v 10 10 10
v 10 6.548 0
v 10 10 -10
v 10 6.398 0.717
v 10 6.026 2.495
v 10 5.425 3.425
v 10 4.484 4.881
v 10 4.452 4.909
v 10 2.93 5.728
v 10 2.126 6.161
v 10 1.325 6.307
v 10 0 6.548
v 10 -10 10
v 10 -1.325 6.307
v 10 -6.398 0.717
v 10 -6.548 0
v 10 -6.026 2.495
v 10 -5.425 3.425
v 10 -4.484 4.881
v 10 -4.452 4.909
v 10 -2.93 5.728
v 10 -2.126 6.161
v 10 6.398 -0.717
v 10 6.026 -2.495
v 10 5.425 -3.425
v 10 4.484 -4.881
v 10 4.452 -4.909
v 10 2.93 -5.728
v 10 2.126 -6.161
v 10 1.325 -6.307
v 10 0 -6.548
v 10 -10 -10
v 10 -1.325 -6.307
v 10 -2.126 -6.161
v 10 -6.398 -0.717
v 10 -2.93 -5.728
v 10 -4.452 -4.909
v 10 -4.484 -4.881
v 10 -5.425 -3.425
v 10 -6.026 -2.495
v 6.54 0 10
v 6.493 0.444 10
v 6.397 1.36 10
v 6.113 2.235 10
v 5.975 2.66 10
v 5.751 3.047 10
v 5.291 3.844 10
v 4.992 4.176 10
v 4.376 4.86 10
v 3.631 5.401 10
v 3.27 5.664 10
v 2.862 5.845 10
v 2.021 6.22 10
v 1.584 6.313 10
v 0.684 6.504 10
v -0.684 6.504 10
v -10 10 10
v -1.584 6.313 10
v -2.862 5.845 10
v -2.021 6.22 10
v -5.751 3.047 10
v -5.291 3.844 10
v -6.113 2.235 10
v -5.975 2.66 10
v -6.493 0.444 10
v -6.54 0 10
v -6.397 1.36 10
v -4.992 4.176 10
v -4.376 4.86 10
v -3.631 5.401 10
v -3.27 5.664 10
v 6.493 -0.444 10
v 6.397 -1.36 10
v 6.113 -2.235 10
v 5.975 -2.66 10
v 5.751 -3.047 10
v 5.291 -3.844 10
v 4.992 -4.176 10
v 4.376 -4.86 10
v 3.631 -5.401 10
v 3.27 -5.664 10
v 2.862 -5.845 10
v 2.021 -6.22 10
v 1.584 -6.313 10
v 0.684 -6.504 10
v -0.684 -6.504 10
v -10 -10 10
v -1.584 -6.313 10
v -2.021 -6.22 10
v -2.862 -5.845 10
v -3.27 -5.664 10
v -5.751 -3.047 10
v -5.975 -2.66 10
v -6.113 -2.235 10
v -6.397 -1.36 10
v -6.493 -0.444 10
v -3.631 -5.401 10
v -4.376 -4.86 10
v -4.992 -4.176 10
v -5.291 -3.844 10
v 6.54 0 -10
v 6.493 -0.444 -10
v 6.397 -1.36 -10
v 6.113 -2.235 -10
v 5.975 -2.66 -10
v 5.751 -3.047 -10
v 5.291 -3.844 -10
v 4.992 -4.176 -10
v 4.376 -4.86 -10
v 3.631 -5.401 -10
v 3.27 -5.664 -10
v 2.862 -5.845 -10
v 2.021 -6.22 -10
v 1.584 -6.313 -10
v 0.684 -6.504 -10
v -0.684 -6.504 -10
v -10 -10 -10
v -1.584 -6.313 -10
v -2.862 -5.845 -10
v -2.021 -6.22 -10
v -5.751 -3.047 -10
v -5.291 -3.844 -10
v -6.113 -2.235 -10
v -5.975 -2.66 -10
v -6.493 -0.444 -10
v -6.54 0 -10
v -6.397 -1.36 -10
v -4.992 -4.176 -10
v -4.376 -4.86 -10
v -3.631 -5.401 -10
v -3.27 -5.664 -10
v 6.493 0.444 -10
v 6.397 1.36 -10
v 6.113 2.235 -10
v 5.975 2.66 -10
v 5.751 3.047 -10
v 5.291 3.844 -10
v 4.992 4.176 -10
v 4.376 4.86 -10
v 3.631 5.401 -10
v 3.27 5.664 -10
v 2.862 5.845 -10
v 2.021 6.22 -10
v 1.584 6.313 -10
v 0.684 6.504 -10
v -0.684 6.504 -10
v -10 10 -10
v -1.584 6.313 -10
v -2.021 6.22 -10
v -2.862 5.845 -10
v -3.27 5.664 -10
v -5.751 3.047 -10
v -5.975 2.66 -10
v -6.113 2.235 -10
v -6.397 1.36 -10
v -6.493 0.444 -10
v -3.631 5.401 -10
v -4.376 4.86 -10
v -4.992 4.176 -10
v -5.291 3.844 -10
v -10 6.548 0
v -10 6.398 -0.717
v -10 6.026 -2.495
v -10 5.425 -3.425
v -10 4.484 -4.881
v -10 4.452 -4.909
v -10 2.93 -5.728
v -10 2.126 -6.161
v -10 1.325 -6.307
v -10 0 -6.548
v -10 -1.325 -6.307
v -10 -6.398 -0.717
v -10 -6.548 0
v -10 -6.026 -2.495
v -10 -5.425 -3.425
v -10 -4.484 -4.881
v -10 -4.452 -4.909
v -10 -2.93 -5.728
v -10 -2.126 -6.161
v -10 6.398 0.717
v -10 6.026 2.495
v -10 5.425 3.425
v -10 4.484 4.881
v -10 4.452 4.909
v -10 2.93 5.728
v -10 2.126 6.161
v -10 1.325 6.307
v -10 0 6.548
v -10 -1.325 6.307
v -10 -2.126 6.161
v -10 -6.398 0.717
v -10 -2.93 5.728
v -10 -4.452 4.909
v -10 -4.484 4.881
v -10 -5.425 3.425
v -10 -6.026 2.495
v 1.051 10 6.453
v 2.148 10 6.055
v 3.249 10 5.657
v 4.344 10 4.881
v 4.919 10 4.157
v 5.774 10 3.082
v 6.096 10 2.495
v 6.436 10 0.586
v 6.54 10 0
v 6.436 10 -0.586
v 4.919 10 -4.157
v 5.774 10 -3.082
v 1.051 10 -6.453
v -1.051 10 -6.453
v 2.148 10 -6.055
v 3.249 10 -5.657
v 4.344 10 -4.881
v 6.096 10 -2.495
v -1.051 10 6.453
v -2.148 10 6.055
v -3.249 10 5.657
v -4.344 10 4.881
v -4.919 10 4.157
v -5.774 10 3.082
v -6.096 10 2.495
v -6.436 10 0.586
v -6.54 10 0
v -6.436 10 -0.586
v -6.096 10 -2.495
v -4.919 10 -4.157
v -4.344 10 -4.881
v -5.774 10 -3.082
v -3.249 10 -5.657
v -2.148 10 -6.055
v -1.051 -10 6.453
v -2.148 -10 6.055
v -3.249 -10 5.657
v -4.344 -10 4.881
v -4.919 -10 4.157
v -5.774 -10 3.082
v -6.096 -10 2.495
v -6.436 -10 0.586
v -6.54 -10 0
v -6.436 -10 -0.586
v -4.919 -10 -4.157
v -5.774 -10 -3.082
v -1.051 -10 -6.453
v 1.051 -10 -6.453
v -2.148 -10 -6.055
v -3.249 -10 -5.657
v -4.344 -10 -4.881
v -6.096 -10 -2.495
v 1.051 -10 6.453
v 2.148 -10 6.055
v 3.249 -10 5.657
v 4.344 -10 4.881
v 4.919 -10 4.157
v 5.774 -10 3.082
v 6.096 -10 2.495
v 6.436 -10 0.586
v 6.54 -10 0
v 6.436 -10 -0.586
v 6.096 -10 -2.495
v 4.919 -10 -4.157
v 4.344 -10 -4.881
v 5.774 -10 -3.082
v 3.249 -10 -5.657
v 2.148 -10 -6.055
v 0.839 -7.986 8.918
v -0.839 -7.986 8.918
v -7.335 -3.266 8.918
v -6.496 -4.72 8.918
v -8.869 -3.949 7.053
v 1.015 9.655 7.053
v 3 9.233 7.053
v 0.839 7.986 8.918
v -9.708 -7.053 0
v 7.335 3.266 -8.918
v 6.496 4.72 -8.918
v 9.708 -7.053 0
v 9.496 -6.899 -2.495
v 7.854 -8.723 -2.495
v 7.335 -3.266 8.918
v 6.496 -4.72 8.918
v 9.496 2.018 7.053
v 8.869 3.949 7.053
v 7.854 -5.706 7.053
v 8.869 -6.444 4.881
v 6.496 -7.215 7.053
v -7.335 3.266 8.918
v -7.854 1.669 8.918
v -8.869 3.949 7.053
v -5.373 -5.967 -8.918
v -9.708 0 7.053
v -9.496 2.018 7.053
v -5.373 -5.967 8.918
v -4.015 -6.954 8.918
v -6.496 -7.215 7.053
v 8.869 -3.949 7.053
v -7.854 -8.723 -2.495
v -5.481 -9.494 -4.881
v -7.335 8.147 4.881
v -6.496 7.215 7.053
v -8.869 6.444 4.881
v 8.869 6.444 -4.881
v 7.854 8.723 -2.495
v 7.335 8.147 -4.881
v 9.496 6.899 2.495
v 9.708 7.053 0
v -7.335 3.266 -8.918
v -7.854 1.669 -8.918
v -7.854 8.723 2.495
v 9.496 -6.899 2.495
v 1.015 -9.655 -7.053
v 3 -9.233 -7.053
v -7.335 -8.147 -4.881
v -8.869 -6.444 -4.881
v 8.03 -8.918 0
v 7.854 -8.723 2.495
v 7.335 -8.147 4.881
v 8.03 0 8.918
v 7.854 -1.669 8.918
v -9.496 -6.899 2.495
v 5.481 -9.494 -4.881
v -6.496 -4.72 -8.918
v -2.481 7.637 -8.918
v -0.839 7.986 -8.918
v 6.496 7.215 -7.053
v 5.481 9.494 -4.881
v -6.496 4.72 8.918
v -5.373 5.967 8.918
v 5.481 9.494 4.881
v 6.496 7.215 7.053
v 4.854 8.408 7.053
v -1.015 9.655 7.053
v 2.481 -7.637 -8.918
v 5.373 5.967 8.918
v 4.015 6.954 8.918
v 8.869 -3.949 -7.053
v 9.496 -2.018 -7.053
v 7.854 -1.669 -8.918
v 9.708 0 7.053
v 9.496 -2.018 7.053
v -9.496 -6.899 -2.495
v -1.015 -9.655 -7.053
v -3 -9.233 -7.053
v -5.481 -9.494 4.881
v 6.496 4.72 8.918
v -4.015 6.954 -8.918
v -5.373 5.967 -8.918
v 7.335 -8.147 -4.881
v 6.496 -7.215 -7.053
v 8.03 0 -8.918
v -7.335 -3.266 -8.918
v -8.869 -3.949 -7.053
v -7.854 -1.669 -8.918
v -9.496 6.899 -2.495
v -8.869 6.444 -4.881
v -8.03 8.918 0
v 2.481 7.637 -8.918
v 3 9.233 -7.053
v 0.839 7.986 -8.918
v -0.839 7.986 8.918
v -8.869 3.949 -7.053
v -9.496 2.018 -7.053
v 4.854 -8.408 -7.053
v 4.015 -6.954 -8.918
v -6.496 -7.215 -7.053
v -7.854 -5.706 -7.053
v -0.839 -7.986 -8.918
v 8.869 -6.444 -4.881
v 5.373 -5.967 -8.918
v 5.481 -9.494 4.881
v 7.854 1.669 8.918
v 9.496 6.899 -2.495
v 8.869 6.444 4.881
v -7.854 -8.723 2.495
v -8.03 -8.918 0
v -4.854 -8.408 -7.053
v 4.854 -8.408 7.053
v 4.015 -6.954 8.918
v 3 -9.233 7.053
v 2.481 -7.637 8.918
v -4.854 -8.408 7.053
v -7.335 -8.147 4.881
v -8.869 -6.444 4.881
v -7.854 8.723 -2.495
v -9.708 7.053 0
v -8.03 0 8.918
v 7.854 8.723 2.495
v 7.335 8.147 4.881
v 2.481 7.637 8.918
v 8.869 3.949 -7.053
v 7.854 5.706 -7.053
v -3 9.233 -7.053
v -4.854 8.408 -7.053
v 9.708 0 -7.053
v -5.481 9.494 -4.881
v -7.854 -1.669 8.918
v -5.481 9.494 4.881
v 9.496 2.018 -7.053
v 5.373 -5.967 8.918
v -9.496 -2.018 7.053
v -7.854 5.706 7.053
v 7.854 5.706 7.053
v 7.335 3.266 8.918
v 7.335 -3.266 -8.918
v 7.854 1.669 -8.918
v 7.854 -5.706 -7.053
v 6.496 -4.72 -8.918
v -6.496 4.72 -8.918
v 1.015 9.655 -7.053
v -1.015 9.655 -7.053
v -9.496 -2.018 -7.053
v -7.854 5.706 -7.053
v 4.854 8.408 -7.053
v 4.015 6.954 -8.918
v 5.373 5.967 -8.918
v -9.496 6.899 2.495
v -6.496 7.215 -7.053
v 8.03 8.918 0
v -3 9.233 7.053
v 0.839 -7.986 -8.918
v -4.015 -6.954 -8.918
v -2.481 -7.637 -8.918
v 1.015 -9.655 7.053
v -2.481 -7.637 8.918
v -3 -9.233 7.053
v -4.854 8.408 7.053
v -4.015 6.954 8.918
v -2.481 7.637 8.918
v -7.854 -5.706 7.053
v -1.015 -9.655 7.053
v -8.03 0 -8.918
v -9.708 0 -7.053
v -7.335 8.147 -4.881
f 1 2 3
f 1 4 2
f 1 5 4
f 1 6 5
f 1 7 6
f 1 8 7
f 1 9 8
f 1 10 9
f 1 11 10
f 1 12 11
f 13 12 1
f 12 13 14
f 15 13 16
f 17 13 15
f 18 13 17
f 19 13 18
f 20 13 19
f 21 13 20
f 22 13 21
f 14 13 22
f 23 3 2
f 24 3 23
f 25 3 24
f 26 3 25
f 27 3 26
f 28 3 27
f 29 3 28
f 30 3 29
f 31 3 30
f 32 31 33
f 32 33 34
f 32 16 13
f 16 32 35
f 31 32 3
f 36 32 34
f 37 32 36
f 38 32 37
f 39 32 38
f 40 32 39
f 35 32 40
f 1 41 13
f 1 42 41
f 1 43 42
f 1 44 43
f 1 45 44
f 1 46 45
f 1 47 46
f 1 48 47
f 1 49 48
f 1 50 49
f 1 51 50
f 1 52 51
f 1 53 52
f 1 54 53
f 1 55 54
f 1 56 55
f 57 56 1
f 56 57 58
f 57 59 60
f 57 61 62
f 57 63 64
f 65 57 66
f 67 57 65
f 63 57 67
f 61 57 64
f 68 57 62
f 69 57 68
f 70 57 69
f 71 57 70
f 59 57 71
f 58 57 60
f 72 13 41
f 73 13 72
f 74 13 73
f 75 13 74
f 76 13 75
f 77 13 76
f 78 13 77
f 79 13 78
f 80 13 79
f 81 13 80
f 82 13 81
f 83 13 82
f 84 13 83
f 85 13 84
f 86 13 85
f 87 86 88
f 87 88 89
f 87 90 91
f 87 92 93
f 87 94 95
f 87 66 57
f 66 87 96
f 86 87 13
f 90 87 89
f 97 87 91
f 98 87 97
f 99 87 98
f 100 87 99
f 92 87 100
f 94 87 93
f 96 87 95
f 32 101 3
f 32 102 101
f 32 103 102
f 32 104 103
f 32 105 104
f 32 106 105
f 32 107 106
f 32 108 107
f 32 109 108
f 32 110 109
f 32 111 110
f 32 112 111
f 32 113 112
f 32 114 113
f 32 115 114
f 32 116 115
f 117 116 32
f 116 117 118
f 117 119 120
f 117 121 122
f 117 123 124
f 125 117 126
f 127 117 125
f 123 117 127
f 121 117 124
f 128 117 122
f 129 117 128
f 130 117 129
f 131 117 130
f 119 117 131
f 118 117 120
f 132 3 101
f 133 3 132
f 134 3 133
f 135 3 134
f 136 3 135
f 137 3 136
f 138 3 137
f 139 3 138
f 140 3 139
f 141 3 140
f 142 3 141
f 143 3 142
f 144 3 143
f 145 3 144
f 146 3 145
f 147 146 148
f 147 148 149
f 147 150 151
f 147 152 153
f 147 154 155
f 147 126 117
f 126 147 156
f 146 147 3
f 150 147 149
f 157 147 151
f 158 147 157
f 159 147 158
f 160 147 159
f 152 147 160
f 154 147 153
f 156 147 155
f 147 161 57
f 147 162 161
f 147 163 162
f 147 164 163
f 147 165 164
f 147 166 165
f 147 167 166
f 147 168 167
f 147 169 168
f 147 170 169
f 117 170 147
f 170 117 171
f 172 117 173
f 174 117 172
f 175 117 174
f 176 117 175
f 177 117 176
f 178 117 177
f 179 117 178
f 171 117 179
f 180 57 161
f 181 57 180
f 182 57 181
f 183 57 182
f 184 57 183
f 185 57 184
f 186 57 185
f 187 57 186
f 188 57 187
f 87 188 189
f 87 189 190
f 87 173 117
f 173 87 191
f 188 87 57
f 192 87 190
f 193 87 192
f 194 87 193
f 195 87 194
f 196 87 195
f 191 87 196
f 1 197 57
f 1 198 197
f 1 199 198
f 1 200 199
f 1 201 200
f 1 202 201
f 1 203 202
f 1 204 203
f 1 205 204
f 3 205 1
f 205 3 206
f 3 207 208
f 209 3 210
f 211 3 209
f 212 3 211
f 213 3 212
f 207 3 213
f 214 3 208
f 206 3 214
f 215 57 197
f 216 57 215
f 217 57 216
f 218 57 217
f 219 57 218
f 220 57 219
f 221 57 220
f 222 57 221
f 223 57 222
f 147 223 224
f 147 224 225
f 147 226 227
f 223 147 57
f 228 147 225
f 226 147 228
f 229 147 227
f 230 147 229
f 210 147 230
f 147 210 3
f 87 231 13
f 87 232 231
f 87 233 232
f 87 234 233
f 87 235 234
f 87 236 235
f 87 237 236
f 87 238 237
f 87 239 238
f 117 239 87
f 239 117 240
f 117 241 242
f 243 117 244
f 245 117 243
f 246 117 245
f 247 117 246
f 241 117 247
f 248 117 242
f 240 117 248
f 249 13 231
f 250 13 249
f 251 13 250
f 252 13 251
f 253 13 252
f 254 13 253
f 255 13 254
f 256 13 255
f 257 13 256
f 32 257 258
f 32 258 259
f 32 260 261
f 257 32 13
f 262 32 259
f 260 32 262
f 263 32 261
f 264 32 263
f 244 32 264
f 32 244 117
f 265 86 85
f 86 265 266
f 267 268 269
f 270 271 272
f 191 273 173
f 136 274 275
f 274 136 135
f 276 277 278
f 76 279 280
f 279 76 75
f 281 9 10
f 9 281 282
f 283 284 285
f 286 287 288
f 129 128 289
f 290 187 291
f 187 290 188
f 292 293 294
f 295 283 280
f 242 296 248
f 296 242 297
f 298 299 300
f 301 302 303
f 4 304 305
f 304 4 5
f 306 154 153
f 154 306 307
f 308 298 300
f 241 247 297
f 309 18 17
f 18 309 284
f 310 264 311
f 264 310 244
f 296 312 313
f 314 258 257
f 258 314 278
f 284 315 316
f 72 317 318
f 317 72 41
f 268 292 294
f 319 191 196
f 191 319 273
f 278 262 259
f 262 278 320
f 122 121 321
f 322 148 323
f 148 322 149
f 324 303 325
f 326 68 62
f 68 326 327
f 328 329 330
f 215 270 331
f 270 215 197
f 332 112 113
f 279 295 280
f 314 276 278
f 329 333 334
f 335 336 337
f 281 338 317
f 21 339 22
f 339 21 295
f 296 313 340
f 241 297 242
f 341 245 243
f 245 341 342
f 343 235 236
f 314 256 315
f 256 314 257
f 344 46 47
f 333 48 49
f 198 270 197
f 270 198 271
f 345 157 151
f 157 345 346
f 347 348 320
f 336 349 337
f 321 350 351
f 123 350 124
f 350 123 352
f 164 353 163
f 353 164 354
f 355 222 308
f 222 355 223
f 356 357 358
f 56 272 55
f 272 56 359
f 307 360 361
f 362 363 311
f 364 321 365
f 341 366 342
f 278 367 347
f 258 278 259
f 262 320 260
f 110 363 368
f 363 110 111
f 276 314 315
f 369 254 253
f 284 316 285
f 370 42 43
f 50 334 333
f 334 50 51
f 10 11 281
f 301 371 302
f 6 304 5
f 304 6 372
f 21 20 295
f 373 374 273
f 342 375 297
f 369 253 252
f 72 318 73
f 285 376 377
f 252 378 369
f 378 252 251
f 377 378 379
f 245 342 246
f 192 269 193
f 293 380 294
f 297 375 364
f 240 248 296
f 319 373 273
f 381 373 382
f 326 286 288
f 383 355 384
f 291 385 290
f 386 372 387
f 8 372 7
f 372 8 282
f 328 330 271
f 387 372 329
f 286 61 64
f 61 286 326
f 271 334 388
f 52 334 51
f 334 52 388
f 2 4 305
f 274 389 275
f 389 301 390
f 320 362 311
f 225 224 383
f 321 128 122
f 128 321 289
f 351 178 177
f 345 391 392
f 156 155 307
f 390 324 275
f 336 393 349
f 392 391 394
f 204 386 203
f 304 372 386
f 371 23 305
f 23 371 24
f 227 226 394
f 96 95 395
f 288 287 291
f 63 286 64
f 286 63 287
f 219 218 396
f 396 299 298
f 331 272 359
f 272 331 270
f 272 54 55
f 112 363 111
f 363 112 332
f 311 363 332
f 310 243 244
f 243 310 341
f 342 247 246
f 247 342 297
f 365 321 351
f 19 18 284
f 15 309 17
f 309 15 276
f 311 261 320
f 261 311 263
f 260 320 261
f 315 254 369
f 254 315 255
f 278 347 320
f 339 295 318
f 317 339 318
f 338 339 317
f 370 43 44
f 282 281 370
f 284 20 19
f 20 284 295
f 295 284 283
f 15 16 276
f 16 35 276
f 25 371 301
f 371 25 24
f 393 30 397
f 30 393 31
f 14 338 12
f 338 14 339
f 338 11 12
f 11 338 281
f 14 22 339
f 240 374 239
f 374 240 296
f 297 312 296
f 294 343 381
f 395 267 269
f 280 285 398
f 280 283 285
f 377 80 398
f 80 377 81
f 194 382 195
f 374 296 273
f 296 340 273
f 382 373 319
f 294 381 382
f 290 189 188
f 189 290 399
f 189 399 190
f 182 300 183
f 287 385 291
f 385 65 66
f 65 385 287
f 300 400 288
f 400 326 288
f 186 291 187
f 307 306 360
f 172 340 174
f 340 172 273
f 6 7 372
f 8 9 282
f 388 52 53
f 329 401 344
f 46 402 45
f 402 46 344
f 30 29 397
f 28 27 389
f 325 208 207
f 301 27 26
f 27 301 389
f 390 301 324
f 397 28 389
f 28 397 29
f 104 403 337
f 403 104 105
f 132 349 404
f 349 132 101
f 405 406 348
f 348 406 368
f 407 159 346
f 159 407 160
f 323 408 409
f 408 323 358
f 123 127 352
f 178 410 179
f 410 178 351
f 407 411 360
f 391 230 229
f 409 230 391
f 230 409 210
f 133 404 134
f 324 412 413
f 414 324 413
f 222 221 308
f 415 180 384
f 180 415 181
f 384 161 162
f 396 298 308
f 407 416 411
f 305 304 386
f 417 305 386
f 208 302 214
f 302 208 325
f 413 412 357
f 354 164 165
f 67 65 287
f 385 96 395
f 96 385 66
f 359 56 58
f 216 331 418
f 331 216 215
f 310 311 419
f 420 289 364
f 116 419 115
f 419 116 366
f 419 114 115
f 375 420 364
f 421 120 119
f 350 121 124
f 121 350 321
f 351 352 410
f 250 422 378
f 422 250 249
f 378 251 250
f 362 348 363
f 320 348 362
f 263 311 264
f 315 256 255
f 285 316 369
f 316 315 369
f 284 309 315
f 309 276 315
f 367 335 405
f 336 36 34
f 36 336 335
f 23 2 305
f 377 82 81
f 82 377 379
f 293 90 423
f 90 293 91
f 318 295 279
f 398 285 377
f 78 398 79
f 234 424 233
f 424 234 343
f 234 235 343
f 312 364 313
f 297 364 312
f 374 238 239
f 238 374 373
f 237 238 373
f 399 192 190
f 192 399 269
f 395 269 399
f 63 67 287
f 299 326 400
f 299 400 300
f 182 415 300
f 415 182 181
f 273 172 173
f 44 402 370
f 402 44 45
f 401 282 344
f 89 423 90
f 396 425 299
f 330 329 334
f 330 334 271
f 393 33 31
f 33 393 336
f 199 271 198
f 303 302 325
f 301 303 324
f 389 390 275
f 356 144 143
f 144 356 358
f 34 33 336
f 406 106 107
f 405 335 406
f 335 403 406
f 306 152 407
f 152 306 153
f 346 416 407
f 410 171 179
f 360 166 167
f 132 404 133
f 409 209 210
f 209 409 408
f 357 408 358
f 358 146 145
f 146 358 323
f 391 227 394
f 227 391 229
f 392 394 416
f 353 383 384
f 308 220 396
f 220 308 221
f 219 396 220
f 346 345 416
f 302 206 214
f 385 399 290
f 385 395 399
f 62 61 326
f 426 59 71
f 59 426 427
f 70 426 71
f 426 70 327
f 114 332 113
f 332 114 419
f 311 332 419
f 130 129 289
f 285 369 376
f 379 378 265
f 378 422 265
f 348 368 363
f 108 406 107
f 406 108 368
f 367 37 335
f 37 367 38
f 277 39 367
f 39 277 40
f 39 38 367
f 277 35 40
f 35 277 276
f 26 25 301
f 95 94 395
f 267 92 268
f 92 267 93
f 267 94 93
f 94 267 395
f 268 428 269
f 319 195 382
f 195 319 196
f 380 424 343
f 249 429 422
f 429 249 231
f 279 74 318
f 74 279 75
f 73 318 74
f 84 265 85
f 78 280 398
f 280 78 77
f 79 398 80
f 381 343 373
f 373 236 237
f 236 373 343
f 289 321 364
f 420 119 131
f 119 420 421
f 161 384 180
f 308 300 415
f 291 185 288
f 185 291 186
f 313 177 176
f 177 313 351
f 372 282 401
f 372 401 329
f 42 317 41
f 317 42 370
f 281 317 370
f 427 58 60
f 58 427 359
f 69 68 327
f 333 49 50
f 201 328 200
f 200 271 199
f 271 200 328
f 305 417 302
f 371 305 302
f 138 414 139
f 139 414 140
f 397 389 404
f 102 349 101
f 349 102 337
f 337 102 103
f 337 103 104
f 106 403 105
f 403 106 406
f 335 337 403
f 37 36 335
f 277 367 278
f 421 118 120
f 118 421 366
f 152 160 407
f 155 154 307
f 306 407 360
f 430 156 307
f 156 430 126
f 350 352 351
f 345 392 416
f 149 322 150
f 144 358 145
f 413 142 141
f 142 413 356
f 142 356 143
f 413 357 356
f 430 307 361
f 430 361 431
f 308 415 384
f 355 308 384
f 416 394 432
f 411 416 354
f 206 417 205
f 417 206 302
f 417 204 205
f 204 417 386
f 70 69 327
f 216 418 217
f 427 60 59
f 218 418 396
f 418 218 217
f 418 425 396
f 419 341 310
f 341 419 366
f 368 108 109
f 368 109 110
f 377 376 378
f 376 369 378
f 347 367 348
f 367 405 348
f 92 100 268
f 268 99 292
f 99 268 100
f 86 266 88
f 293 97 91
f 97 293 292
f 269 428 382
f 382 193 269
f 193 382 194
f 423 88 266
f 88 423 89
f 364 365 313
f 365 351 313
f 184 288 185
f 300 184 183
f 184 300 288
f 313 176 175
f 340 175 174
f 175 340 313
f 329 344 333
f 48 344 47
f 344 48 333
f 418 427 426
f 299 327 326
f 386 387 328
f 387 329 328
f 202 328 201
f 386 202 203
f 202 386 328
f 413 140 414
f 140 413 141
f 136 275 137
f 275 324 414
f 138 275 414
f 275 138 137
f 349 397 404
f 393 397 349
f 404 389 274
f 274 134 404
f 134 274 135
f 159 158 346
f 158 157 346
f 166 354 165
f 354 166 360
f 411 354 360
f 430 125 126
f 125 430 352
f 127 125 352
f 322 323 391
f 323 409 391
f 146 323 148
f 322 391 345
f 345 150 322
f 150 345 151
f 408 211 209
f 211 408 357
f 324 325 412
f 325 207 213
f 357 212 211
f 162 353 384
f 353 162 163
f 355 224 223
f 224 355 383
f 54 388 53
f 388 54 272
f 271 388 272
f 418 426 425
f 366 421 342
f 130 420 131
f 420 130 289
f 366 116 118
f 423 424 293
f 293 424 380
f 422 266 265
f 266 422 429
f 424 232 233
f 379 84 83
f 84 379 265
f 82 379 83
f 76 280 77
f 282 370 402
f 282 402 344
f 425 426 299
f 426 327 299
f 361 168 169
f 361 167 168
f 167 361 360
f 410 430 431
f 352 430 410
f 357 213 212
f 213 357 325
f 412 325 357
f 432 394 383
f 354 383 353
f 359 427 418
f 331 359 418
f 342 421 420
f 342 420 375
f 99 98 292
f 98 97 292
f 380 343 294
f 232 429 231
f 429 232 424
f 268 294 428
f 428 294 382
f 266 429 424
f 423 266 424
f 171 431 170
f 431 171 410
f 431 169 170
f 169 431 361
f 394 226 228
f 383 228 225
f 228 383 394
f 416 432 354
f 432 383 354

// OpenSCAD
// Cube with spherical cutout
difference() {
    cube(20, center = true);
    sphere(12);
}
